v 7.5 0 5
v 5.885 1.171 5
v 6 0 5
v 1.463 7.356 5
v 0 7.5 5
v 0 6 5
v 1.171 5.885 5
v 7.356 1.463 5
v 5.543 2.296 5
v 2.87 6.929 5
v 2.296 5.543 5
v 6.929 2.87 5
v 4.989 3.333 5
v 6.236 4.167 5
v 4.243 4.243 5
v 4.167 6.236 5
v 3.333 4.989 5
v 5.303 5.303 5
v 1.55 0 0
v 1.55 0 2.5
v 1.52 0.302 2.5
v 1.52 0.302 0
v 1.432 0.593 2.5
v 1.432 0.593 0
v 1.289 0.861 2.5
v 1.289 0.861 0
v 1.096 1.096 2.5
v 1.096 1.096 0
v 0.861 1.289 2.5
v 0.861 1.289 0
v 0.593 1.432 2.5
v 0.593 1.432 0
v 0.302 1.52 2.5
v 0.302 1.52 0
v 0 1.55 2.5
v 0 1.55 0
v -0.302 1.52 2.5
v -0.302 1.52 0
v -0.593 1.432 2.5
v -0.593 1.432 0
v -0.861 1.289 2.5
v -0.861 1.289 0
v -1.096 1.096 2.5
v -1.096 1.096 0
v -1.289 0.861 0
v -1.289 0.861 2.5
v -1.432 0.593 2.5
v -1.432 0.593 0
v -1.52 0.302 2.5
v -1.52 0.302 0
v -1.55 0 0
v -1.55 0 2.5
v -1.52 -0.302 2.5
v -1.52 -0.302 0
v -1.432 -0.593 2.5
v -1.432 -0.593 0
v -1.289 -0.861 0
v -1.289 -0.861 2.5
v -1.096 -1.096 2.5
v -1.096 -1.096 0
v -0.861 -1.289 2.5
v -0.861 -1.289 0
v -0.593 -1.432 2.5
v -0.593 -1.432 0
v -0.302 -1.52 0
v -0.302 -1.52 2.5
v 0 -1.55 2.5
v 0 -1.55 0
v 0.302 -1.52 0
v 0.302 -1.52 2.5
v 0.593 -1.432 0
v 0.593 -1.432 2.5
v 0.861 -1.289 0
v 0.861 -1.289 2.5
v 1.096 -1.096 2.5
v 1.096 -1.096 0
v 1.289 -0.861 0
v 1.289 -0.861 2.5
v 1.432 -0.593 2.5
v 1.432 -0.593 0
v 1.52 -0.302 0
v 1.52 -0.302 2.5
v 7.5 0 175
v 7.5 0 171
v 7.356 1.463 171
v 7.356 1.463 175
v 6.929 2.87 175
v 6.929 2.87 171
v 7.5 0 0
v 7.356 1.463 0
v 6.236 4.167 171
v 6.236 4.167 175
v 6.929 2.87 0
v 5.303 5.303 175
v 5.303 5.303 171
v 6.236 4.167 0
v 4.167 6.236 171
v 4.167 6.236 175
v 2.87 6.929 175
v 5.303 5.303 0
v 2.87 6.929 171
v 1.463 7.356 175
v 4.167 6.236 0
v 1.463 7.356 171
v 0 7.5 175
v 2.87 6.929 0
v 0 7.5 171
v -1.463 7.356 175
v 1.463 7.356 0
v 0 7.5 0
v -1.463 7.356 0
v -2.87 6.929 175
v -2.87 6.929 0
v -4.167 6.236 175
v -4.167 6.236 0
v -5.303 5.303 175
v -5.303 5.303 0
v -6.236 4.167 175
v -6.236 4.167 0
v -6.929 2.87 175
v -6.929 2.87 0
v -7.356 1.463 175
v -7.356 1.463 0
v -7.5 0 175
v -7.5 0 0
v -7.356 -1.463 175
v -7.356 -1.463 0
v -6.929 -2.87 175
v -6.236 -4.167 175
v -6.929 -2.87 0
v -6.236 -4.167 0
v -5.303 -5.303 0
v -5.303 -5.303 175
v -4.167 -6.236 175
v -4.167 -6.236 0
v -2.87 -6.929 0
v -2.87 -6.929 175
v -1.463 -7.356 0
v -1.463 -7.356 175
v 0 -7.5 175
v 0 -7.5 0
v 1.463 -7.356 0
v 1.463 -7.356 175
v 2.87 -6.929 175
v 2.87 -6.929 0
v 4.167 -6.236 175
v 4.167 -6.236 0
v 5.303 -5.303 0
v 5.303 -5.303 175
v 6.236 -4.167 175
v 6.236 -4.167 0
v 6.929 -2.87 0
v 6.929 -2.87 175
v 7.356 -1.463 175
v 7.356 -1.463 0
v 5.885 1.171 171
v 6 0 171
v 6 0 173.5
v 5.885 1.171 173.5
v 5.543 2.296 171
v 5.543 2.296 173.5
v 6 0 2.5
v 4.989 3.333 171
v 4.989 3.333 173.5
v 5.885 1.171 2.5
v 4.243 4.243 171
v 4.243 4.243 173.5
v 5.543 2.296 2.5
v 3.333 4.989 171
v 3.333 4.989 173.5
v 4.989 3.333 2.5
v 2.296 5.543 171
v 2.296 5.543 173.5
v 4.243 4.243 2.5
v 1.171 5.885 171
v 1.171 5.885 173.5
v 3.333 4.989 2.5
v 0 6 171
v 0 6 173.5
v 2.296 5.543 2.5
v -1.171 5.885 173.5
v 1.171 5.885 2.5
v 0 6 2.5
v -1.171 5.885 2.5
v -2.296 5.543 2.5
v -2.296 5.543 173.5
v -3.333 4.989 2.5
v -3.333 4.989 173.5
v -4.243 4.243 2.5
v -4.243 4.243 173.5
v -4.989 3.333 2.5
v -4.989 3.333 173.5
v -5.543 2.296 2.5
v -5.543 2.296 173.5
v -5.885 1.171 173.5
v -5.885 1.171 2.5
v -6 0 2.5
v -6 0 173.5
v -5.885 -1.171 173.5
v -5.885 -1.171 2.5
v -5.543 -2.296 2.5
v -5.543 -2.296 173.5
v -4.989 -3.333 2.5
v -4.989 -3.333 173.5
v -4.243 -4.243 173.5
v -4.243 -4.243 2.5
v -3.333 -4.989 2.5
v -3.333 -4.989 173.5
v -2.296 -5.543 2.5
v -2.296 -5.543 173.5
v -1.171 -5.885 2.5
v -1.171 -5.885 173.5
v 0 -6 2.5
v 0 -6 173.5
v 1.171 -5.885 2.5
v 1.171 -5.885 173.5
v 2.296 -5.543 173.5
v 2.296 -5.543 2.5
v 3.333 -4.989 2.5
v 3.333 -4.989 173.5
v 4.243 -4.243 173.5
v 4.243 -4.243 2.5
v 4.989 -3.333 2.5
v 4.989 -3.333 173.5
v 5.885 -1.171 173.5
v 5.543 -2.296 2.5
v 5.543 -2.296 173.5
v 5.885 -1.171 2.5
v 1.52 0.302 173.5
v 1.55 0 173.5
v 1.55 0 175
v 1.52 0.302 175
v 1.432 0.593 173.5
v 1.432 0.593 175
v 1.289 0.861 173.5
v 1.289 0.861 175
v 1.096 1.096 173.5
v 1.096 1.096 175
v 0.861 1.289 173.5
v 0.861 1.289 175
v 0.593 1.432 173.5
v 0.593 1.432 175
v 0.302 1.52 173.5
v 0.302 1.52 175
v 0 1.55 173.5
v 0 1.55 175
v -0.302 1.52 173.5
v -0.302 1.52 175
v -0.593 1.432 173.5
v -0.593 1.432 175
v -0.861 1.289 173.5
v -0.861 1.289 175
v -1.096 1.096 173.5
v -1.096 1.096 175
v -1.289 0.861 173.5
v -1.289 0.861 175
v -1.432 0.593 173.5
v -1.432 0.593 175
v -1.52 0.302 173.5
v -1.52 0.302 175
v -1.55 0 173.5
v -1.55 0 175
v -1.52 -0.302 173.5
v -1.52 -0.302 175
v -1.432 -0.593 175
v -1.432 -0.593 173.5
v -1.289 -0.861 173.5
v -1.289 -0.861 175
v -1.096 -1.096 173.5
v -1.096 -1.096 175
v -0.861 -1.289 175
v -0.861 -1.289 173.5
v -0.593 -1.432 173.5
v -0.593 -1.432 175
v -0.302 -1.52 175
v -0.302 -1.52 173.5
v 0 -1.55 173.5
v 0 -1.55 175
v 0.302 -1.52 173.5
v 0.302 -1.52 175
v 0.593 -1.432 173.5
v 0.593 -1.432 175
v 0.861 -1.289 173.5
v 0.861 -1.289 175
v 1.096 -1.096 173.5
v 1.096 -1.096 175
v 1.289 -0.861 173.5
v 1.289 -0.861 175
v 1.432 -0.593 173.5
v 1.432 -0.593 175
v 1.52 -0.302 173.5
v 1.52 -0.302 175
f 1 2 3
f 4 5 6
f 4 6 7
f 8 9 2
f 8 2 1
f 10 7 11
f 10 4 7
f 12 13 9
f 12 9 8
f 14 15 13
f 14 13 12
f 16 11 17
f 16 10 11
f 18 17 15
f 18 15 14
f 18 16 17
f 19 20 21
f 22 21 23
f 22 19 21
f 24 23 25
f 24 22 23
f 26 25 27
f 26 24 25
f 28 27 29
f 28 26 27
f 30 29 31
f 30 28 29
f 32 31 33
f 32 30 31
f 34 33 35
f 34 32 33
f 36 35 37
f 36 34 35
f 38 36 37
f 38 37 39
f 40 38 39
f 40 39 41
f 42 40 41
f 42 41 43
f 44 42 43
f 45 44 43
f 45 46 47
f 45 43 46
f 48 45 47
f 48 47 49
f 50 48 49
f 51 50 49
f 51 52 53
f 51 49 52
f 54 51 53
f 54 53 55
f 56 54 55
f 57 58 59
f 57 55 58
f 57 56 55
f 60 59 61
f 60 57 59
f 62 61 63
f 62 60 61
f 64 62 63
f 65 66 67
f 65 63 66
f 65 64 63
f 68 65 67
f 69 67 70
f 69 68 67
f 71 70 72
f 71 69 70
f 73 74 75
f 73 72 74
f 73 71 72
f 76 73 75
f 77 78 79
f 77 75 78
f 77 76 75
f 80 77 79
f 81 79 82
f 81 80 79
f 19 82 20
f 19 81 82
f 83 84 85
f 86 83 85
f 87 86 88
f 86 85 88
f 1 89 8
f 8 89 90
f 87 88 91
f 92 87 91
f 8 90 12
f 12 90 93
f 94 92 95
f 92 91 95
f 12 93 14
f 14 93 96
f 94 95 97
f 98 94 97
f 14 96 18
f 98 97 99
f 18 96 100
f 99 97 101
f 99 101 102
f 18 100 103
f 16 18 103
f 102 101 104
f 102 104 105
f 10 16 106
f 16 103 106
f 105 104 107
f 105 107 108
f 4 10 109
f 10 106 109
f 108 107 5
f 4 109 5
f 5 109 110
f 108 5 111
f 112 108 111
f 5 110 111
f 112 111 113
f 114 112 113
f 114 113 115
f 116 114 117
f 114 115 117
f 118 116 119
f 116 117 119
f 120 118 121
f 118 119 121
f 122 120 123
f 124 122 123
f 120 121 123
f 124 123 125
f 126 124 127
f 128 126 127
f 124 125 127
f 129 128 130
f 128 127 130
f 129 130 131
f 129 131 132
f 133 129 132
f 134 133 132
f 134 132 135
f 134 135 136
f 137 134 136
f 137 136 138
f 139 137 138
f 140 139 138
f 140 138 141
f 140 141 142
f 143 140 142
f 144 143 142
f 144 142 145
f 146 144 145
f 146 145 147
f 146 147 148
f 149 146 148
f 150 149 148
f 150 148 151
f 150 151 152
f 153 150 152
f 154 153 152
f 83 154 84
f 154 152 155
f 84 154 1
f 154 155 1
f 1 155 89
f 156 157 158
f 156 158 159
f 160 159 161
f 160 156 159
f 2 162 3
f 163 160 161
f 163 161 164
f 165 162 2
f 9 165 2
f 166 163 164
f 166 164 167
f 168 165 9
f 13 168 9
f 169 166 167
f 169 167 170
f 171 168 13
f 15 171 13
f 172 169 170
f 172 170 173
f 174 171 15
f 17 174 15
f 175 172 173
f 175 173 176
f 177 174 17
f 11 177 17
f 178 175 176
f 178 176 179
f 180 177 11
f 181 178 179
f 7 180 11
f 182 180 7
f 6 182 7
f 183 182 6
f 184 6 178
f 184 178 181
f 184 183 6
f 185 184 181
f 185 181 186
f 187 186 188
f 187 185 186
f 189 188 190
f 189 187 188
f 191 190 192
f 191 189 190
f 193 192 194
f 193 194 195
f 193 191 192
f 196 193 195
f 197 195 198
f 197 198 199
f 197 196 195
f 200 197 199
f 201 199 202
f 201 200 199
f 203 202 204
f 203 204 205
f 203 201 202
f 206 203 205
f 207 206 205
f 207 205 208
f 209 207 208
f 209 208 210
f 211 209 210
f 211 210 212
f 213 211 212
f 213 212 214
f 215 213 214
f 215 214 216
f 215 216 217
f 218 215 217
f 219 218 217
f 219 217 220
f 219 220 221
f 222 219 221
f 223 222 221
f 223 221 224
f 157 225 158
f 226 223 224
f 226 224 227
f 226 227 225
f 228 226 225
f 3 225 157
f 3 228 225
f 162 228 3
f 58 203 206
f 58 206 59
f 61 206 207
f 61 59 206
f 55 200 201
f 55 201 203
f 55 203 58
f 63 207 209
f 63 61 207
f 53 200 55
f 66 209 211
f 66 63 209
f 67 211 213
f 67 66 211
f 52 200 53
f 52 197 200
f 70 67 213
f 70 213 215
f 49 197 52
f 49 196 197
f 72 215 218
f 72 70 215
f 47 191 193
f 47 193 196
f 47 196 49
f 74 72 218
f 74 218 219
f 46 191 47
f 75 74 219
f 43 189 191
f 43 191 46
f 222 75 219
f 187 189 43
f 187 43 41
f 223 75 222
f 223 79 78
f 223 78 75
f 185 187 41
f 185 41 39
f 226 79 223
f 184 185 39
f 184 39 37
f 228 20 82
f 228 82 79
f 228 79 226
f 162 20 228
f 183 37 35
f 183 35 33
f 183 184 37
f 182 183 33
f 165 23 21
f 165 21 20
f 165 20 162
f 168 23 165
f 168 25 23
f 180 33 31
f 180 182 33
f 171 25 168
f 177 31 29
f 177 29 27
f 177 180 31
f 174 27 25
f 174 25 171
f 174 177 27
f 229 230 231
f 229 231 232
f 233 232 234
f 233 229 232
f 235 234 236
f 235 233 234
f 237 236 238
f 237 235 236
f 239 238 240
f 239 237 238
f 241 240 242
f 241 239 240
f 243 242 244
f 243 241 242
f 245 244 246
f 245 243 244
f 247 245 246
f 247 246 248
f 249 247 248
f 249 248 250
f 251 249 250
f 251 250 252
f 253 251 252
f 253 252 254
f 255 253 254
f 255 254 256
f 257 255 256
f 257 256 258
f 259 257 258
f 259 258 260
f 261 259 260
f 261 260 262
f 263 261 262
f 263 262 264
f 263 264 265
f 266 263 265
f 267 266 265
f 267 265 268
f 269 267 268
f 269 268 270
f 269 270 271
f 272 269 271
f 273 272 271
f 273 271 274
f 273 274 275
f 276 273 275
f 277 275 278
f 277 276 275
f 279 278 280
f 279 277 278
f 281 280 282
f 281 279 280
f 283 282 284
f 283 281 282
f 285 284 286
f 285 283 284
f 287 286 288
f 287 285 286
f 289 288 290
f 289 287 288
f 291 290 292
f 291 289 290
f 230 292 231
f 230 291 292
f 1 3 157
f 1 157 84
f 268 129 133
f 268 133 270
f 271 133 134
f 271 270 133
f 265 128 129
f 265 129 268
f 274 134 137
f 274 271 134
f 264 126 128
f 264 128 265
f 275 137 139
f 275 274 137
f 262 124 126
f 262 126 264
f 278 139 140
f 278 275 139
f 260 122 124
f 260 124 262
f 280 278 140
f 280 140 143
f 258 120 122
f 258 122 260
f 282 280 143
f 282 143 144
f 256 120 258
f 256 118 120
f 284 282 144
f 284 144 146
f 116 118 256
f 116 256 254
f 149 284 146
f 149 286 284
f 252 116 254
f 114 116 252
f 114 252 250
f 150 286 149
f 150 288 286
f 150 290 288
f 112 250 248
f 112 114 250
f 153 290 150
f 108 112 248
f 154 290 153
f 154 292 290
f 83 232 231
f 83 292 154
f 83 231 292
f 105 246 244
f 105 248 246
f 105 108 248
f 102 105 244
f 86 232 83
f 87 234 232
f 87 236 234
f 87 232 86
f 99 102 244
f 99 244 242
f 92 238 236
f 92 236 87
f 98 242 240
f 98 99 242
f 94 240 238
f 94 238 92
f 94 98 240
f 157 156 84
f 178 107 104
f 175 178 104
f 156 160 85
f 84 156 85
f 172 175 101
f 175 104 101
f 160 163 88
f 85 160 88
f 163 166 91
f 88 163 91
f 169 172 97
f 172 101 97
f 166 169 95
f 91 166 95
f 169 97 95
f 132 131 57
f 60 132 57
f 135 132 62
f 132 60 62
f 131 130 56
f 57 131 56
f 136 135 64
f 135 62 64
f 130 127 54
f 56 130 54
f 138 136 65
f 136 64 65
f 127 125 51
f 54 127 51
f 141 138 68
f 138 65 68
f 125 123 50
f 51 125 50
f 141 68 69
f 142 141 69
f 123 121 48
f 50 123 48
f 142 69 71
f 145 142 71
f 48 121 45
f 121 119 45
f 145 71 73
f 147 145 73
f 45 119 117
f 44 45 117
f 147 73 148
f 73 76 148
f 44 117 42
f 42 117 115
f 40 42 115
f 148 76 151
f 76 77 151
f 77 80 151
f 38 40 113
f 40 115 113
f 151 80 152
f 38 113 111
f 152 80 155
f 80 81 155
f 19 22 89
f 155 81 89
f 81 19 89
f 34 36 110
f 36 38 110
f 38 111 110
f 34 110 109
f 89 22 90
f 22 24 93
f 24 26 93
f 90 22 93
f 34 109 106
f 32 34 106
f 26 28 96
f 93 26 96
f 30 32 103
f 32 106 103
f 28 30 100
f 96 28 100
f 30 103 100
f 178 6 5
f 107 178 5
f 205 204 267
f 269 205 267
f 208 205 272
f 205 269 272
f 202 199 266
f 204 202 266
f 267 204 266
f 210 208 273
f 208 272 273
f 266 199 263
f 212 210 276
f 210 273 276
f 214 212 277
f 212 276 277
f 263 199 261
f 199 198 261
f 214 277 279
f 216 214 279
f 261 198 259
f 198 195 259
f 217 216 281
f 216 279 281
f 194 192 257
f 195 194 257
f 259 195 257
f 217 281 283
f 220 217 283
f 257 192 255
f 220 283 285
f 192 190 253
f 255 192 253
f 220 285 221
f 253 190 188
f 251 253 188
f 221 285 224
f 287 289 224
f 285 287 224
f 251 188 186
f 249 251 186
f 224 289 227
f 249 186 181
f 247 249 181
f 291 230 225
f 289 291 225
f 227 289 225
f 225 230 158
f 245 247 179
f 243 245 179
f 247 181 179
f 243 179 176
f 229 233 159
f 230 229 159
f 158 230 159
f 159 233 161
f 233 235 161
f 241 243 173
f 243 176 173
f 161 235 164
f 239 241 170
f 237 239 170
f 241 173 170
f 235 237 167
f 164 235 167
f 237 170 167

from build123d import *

# Parameters (mm, degrees)
CYLINDER_R        = 7.5
CYLINDER_DEPTH    = 175
BOX_W             = 10
BOX_H             = 10
BOX_DEPTH         = 166
CYLINDER001_R     = 6
CYLINDER001_DEPTH = 171
CYLINDER002_R     = 1.55
CYLINDER002_DEPTH = 175


with BuildPart() as part:
    # Cylinder → Cylinder (join)
    with BuildSketch(Plane.XY):
        Circle(CYLINDER_R)
    extrude(amount=CYLINDER_DEPTH)

    # Box → Box (cut)
    with BuildSketch(Plane.XY.offset(5)):
        with Locations((5, 5)):
            Rectangle(BOX_W, BOX_H)
    extrude(amount=BOX_DEPTH, mode=Mode.SUBTRACT)

    # Cylinder001 → Cylinder001 (cut)
    with BuildSketch(Plane.XY.offset(2.5)):
        Circle(CYLINDER001_R)
    extrude(amount=CYLINDER001_DEPTH, mode=Mode.SUBTRACT)

    # Cylinder002 → Cylinder002 (cut)
    with BuildSketch(Plane.XY):
        Circle(CYLINDER002_R)
    extrude(amount=CYLINDER002_DEPTH, mode=Mode.SUBTRACT)


solid = part.part
